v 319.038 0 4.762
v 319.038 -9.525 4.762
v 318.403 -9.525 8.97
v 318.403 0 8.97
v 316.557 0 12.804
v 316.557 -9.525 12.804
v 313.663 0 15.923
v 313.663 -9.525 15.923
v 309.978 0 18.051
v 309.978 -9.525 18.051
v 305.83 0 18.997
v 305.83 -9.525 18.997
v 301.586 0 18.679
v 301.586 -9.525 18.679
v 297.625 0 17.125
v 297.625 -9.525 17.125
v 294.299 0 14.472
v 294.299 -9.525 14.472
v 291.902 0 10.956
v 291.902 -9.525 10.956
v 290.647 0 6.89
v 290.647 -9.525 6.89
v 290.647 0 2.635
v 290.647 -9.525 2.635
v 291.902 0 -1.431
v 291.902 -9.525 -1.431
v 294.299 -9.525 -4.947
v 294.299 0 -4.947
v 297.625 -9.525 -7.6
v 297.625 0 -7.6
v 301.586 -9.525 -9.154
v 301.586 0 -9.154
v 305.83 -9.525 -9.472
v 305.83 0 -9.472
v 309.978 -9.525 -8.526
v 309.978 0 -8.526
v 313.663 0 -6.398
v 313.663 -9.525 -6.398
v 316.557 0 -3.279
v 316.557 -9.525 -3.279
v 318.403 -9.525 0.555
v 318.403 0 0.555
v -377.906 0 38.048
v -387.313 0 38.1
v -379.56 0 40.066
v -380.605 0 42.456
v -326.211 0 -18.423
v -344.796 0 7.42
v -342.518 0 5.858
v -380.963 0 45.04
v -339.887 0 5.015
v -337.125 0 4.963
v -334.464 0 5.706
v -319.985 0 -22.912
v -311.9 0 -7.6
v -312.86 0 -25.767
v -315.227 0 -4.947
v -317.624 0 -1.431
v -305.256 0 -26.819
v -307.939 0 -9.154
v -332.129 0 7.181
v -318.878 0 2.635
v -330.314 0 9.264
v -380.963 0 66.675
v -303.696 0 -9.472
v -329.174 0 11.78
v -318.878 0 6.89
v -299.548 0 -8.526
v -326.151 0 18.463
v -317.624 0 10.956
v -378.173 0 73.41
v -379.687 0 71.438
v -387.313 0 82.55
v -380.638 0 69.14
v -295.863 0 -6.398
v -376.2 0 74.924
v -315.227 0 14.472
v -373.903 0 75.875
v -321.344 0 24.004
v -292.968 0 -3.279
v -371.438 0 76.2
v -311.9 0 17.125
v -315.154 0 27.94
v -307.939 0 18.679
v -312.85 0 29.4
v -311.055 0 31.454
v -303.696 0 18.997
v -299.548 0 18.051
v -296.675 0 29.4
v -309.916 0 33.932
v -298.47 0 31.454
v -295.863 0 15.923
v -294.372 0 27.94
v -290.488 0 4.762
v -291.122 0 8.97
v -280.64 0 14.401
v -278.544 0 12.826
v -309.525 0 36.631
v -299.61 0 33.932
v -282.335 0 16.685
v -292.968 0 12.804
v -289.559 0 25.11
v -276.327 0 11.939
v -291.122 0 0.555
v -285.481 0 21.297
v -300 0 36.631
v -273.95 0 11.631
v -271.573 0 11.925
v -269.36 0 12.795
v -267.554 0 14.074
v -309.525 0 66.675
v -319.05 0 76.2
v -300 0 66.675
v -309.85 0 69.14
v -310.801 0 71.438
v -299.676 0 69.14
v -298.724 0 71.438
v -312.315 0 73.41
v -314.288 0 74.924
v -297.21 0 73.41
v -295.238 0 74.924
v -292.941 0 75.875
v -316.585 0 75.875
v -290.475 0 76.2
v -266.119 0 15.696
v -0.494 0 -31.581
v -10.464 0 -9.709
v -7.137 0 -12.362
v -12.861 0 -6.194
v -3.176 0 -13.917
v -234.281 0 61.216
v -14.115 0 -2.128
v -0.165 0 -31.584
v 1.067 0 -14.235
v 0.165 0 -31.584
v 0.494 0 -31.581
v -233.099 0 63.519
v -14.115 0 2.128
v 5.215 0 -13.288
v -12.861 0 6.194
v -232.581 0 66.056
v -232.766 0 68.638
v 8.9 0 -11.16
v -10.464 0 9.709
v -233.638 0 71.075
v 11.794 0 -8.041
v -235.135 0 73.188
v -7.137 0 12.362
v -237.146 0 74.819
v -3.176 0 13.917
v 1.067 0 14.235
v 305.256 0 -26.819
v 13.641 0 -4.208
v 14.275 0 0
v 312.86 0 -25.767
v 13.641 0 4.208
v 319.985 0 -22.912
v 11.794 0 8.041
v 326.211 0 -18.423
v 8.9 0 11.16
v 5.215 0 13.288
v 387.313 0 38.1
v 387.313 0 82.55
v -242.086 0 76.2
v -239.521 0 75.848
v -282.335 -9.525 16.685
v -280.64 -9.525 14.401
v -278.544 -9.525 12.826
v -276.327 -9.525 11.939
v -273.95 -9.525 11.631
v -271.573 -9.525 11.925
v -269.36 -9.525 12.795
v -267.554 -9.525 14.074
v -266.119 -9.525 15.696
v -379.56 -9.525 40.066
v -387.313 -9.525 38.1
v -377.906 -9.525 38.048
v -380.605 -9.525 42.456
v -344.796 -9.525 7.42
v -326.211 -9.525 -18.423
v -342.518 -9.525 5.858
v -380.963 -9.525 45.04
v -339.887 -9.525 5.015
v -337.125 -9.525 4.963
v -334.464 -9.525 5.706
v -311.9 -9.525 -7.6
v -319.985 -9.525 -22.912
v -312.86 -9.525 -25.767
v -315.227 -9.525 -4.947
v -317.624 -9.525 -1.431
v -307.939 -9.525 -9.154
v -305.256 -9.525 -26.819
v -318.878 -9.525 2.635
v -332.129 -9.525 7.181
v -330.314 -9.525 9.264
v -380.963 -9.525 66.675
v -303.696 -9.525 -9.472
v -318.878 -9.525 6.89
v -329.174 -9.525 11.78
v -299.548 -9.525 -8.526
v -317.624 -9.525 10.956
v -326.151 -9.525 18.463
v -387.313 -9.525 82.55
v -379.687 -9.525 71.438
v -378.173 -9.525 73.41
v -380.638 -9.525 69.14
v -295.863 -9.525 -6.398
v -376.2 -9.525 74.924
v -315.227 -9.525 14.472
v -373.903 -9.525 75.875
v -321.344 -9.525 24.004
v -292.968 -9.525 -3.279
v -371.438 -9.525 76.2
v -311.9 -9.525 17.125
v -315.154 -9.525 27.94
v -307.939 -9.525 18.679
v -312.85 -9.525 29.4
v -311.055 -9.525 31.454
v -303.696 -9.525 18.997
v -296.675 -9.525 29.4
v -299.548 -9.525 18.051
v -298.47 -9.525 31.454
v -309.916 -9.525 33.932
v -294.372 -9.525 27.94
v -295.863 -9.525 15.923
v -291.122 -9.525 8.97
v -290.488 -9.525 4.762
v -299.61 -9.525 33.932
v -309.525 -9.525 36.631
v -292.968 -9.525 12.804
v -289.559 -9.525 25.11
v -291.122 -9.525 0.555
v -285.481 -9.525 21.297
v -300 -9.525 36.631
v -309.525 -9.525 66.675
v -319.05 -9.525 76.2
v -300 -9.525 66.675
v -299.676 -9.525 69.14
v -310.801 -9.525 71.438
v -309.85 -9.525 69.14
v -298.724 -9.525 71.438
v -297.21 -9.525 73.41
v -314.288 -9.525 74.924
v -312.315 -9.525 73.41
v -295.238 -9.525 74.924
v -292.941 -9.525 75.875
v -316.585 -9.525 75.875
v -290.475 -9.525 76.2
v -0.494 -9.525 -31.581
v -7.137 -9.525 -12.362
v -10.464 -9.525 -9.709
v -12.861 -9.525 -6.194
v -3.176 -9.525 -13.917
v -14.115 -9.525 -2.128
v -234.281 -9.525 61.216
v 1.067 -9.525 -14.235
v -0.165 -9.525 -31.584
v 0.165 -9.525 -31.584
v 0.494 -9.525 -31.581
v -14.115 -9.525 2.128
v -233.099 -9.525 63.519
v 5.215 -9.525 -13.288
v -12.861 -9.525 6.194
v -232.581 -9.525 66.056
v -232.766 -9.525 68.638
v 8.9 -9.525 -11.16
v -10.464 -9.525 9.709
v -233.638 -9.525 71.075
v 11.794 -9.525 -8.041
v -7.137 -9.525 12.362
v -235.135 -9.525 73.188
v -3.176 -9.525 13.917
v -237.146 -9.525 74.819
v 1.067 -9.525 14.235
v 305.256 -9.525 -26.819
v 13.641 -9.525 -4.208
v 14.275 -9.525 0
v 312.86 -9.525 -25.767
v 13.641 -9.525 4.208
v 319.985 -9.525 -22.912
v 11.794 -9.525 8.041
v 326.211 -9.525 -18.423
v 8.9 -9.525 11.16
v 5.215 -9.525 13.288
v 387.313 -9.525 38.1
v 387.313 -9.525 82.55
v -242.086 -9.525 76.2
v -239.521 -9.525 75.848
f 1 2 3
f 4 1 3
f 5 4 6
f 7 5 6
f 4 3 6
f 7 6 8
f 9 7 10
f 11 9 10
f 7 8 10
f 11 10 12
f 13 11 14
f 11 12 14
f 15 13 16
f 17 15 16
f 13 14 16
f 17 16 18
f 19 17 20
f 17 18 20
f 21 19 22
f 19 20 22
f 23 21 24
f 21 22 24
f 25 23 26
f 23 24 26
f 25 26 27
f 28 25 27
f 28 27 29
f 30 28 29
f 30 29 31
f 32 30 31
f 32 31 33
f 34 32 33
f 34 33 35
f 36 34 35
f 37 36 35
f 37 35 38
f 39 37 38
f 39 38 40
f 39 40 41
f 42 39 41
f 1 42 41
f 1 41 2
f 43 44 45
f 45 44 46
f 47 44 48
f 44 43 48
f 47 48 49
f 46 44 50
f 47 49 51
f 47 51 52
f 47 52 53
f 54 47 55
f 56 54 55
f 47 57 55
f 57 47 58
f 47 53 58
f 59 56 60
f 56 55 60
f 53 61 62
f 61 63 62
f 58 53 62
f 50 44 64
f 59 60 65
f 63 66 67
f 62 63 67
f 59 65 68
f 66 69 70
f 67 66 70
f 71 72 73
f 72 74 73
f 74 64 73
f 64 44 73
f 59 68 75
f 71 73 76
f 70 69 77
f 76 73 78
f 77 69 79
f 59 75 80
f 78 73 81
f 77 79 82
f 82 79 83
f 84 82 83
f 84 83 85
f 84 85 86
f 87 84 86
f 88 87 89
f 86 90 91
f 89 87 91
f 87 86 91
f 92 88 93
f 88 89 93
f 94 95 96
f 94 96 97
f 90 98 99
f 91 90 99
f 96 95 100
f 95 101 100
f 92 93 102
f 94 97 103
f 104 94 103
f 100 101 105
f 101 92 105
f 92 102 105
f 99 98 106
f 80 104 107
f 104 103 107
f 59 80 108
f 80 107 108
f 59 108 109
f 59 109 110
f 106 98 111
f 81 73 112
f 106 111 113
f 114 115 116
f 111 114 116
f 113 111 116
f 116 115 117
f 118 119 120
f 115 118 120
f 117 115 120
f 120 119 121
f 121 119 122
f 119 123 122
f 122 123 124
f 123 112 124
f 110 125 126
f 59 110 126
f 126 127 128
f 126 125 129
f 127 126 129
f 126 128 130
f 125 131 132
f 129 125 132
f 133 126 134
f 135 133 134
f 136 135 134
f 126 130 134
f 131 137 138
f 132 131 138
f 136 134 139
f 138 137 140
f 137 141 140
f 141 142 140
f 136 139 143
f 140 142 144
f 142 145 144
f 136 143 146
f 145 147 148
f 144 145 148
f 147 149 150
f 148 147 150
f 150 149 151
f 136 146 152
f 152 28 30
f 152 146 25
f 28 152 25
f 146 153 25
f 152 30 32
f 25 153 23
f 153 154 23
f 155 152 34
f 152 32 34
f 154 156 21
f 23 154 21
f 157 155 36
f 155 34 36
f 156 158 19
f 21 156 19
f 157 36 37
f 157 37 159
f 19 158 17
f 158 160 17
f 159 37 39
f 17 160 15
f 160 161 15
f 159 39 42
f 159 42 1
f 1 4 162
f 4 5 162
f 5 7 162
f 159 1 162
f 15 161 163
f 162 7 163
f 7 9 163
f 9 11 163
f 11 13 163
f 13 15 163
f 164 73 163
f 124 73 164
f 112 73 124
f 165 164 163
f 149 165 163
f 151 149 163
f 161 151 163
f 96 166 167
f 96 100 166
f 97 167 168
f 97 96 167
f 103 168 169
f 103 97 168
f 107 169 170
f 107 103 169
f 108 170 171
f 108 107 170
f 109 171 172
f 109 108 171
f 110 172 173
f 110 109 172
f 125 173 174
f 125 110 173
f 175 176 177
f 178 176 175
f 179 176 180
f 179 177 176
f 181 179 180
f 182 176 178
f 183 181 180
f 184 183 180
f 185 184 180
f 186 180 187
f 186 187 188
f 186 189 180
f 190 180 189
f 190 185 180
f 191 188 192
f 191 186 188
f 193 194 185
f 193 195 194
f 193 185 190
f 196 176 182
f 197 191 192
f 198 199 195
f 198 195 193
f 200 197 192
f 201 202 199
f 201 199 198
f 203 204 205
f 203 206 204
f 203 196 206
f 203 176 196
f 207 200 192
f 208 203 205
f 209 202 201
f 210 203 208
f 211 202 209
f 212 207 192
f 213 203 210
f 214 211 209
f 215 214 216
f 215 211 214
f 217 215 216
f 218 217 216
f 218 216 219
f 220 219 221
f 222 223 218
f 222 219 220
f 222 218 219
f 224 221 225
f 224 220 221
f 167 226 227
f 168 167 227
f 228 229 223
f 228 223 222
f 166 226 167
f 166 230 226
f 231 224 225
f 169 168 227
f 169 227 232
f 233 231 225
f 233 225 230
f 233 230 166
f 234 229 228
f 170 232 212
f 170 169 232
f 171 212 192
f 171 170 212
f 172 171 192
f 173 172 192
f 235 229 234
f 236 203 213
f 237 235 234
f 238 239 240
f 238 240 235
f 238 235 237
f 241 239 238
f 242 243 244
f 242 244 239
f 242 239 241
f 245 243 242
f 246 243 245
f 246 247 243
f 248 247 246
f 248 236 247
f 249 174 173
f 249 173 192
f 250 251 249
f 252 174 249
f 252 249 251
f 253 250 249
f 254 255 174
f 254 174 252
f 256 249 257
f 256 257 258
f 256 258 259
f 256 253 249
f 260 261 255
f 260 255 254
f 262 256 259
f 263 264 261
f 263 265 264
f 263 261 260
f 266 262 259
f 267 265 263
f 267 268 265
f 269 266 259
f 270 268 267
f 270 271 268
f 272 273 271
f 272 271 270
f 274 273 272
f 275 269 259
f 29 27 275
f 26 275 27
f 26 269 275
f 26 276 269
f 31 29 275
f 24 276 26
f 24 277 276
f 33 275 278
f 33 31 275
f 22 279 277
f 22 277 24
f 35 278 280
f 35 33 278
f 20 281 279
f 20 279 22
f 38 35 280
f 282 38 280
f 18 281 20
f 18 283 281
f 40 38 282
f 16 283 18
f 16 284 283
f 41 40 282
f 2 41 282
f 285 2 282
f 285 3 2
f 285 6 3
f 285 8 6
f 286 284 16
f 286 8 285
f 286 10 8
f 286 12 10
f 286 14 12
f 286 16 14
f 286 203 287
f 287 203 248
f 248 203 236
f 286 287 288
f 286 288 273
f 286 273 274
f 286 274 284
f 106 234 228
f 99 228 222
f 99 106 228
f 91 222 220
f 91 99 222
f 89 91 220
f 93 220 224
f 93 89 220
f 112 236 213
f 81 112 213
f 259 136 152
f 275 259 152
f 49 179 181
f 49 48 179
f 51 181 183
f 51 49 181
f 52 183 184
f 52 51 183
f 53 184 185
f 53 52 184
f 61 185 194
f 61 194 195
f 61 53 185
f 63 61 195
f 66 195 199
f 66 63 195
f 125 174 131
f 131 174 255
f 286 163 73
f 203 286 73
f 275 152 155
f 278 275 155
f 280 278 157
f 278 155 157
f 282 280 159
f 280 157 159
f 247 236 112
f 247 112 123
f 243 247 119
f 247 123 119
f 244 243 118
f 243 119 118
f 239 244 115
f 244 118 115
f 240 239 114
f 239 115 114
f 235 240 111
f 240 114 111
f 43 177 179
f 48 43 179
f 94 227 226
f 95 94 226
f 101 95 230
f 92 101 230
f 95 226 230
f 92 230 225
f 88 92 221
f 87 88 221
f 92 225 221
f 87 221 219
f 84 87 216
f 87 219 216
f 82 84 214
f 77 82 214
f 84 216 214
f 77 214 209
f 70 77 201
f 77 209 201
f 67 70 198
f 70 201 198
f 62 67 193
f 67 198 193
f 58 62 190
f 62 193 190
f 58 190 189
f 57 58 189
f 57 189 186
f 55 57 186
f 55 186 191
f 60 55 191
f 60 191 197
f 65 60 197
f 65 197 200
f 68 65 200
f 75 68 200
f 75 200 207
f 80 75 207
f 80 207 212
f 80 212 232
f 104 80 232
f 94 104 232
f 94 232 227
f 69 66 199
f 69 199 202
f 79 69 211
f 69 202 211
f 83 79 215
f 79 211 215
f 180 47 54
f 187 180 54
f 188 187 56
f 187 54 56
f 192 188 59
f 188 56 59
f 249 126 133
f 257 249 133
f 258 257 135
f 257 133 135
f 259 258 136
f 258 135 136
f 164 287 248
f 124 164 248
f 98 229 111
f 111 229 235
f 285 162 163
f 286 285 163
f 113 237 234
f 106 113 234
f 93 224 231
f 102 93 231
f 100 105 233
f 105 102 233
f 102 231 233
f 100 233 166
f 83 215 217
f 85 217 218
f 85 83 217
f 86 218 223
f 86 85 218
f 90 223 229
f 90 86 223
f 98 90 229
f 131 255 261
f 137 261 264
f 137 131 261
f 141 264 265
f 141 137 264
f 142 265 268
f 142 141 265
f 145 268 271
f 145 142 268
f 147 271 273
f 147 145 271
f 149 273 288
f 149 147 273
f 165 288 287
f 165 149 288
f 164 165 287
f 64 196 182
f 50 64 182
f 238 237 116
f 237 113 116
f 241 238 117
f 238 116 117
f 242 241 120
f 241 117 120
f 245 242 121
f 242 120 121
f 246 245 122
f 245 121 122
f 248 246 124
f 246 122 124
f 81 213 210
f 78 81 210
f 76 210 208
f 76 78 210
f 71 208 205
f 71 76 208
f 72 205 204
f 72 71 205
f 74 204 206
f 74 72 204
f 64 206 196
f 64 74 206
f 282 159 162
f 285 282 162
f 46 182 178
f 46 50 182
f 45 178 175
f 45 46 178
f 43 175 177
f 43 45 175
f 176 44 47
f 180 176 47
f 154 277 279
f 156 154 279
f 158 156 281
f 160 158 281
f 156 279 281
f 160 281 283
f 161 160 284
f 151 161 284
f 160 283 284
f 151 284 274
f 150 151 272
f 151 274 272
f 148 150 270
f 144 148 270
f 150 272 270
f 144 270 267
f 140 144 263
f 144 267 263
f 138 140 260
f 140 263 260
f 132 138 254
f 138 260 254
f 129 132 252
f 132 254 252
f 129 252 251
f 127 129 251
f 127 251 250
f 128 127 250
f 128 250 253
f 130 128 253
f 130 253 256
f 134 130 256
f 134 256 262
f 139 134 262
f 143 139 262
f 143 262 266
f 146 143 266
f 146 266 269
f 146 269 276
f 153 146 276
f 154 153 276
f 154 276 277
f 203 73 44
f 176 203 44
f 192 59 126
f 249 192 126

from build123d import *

# Parameters (mm, degrees)
F1_DEPTH = 9.525
F2_R     = 14.2748
F3_DEPTH = 25.4
F4_R     = 9.525


with BuildPart() as f1:
    # F0 (on Front) → F1 (new body)
    with BuildSketch(Plane.XZ):
        with BuildLine():
            Line((387.312791, 82.55), (-387.312791, 82.55))
            Line((-387.312791, 82.55), (-387.312791, 38.1))
            Line((-387.312791, 38.1), (-326.211106, -18.423178))
            ThreePointArc((-326.211106, -18.423178), (-316.509344, -24.556852), (-305.256305, -26.818544))
            Line((-305.256305, -26.818544), (-0.493514, -31.581044))
            ThreePointArc((-0.493514, -31.581044), (0, -31.5849), (0.493514, -31.581044))
            Line((0.493514, -31.581044), (305.256305, -26.818544))
            ThreePointArc((305.256305, -26.818544), (316.509344, -24.556852), (326.211106, -18.423178))
            Line((326.211106, -18.423178), (387.312791, 38.1))
            Line((387.312791, 38.1), (387.312791, 82.55))
        make_face()
    extrude(amount=F1_DEPTH)

    # F2 (on face) → F3 (cut)
    with BuildSketch(Plane.XZ.offset(9.525)):
        with Locations((-304.762791, 4.7625)):
            Circle(F2_R)
        Circle(F2_R)
        with Locations((304.762791, 4.7625)):
            Circle(F2_R)
        with BuildLine():
            Line((-309.525291, 76.2), (-380.962791, 76.2))
            Line((-380.962791, 76.2), (-380.962791, 40.876167))
            Line((-380.962791, 40.876167), (-324.021477, -11.798388))
            ThreePointArc((-324.021477, -11.798388), (-328.742633, 13.136695), (-309.525291, 29.712021))
            Line((-309.525291, 29.712021), (-309.525291, 76.2))
        make_face()
        with BuildLine():
            Line((-300.000291, 76.2), (-300.000291, 29.712021))
            ThreePointArc((-300.000291, 29.712021), (-281.230857, 14.323259), (-283.948798, -9.795581))
            Line((-283.948798, -9.795581), (-223.800291, 76.2))
            Line((-223.800291, 76.2), (-300.000291, 76.2))
        make_face()
    extrude(amount=-F3_DEPTH, mode=Mode.SUBTRACT)

    # F4
    f4_edges = [f1.edges().sort_by_distance(p)[0] for p in [
        (-300.000291, -4.7625, 29.712021),
        (-300.000291, -4.7625, 76.2),
        (-223.800291, -4.7625, 76.2),
        (-283.948798, -4.7625, -9.795581),
        (-309.525291, -4.7625, 29.712021),
        (-324.021477, -4.7625, -11.798388),
        (-380.962791, -4.7625, 40.876167),
        (-380.962791, -4.7625, 76.2),
        (-309.525291, -4.7625, 76.2),
    ]]
    fillet(f4_edges, radius=F4_R)


solid = f1.part
